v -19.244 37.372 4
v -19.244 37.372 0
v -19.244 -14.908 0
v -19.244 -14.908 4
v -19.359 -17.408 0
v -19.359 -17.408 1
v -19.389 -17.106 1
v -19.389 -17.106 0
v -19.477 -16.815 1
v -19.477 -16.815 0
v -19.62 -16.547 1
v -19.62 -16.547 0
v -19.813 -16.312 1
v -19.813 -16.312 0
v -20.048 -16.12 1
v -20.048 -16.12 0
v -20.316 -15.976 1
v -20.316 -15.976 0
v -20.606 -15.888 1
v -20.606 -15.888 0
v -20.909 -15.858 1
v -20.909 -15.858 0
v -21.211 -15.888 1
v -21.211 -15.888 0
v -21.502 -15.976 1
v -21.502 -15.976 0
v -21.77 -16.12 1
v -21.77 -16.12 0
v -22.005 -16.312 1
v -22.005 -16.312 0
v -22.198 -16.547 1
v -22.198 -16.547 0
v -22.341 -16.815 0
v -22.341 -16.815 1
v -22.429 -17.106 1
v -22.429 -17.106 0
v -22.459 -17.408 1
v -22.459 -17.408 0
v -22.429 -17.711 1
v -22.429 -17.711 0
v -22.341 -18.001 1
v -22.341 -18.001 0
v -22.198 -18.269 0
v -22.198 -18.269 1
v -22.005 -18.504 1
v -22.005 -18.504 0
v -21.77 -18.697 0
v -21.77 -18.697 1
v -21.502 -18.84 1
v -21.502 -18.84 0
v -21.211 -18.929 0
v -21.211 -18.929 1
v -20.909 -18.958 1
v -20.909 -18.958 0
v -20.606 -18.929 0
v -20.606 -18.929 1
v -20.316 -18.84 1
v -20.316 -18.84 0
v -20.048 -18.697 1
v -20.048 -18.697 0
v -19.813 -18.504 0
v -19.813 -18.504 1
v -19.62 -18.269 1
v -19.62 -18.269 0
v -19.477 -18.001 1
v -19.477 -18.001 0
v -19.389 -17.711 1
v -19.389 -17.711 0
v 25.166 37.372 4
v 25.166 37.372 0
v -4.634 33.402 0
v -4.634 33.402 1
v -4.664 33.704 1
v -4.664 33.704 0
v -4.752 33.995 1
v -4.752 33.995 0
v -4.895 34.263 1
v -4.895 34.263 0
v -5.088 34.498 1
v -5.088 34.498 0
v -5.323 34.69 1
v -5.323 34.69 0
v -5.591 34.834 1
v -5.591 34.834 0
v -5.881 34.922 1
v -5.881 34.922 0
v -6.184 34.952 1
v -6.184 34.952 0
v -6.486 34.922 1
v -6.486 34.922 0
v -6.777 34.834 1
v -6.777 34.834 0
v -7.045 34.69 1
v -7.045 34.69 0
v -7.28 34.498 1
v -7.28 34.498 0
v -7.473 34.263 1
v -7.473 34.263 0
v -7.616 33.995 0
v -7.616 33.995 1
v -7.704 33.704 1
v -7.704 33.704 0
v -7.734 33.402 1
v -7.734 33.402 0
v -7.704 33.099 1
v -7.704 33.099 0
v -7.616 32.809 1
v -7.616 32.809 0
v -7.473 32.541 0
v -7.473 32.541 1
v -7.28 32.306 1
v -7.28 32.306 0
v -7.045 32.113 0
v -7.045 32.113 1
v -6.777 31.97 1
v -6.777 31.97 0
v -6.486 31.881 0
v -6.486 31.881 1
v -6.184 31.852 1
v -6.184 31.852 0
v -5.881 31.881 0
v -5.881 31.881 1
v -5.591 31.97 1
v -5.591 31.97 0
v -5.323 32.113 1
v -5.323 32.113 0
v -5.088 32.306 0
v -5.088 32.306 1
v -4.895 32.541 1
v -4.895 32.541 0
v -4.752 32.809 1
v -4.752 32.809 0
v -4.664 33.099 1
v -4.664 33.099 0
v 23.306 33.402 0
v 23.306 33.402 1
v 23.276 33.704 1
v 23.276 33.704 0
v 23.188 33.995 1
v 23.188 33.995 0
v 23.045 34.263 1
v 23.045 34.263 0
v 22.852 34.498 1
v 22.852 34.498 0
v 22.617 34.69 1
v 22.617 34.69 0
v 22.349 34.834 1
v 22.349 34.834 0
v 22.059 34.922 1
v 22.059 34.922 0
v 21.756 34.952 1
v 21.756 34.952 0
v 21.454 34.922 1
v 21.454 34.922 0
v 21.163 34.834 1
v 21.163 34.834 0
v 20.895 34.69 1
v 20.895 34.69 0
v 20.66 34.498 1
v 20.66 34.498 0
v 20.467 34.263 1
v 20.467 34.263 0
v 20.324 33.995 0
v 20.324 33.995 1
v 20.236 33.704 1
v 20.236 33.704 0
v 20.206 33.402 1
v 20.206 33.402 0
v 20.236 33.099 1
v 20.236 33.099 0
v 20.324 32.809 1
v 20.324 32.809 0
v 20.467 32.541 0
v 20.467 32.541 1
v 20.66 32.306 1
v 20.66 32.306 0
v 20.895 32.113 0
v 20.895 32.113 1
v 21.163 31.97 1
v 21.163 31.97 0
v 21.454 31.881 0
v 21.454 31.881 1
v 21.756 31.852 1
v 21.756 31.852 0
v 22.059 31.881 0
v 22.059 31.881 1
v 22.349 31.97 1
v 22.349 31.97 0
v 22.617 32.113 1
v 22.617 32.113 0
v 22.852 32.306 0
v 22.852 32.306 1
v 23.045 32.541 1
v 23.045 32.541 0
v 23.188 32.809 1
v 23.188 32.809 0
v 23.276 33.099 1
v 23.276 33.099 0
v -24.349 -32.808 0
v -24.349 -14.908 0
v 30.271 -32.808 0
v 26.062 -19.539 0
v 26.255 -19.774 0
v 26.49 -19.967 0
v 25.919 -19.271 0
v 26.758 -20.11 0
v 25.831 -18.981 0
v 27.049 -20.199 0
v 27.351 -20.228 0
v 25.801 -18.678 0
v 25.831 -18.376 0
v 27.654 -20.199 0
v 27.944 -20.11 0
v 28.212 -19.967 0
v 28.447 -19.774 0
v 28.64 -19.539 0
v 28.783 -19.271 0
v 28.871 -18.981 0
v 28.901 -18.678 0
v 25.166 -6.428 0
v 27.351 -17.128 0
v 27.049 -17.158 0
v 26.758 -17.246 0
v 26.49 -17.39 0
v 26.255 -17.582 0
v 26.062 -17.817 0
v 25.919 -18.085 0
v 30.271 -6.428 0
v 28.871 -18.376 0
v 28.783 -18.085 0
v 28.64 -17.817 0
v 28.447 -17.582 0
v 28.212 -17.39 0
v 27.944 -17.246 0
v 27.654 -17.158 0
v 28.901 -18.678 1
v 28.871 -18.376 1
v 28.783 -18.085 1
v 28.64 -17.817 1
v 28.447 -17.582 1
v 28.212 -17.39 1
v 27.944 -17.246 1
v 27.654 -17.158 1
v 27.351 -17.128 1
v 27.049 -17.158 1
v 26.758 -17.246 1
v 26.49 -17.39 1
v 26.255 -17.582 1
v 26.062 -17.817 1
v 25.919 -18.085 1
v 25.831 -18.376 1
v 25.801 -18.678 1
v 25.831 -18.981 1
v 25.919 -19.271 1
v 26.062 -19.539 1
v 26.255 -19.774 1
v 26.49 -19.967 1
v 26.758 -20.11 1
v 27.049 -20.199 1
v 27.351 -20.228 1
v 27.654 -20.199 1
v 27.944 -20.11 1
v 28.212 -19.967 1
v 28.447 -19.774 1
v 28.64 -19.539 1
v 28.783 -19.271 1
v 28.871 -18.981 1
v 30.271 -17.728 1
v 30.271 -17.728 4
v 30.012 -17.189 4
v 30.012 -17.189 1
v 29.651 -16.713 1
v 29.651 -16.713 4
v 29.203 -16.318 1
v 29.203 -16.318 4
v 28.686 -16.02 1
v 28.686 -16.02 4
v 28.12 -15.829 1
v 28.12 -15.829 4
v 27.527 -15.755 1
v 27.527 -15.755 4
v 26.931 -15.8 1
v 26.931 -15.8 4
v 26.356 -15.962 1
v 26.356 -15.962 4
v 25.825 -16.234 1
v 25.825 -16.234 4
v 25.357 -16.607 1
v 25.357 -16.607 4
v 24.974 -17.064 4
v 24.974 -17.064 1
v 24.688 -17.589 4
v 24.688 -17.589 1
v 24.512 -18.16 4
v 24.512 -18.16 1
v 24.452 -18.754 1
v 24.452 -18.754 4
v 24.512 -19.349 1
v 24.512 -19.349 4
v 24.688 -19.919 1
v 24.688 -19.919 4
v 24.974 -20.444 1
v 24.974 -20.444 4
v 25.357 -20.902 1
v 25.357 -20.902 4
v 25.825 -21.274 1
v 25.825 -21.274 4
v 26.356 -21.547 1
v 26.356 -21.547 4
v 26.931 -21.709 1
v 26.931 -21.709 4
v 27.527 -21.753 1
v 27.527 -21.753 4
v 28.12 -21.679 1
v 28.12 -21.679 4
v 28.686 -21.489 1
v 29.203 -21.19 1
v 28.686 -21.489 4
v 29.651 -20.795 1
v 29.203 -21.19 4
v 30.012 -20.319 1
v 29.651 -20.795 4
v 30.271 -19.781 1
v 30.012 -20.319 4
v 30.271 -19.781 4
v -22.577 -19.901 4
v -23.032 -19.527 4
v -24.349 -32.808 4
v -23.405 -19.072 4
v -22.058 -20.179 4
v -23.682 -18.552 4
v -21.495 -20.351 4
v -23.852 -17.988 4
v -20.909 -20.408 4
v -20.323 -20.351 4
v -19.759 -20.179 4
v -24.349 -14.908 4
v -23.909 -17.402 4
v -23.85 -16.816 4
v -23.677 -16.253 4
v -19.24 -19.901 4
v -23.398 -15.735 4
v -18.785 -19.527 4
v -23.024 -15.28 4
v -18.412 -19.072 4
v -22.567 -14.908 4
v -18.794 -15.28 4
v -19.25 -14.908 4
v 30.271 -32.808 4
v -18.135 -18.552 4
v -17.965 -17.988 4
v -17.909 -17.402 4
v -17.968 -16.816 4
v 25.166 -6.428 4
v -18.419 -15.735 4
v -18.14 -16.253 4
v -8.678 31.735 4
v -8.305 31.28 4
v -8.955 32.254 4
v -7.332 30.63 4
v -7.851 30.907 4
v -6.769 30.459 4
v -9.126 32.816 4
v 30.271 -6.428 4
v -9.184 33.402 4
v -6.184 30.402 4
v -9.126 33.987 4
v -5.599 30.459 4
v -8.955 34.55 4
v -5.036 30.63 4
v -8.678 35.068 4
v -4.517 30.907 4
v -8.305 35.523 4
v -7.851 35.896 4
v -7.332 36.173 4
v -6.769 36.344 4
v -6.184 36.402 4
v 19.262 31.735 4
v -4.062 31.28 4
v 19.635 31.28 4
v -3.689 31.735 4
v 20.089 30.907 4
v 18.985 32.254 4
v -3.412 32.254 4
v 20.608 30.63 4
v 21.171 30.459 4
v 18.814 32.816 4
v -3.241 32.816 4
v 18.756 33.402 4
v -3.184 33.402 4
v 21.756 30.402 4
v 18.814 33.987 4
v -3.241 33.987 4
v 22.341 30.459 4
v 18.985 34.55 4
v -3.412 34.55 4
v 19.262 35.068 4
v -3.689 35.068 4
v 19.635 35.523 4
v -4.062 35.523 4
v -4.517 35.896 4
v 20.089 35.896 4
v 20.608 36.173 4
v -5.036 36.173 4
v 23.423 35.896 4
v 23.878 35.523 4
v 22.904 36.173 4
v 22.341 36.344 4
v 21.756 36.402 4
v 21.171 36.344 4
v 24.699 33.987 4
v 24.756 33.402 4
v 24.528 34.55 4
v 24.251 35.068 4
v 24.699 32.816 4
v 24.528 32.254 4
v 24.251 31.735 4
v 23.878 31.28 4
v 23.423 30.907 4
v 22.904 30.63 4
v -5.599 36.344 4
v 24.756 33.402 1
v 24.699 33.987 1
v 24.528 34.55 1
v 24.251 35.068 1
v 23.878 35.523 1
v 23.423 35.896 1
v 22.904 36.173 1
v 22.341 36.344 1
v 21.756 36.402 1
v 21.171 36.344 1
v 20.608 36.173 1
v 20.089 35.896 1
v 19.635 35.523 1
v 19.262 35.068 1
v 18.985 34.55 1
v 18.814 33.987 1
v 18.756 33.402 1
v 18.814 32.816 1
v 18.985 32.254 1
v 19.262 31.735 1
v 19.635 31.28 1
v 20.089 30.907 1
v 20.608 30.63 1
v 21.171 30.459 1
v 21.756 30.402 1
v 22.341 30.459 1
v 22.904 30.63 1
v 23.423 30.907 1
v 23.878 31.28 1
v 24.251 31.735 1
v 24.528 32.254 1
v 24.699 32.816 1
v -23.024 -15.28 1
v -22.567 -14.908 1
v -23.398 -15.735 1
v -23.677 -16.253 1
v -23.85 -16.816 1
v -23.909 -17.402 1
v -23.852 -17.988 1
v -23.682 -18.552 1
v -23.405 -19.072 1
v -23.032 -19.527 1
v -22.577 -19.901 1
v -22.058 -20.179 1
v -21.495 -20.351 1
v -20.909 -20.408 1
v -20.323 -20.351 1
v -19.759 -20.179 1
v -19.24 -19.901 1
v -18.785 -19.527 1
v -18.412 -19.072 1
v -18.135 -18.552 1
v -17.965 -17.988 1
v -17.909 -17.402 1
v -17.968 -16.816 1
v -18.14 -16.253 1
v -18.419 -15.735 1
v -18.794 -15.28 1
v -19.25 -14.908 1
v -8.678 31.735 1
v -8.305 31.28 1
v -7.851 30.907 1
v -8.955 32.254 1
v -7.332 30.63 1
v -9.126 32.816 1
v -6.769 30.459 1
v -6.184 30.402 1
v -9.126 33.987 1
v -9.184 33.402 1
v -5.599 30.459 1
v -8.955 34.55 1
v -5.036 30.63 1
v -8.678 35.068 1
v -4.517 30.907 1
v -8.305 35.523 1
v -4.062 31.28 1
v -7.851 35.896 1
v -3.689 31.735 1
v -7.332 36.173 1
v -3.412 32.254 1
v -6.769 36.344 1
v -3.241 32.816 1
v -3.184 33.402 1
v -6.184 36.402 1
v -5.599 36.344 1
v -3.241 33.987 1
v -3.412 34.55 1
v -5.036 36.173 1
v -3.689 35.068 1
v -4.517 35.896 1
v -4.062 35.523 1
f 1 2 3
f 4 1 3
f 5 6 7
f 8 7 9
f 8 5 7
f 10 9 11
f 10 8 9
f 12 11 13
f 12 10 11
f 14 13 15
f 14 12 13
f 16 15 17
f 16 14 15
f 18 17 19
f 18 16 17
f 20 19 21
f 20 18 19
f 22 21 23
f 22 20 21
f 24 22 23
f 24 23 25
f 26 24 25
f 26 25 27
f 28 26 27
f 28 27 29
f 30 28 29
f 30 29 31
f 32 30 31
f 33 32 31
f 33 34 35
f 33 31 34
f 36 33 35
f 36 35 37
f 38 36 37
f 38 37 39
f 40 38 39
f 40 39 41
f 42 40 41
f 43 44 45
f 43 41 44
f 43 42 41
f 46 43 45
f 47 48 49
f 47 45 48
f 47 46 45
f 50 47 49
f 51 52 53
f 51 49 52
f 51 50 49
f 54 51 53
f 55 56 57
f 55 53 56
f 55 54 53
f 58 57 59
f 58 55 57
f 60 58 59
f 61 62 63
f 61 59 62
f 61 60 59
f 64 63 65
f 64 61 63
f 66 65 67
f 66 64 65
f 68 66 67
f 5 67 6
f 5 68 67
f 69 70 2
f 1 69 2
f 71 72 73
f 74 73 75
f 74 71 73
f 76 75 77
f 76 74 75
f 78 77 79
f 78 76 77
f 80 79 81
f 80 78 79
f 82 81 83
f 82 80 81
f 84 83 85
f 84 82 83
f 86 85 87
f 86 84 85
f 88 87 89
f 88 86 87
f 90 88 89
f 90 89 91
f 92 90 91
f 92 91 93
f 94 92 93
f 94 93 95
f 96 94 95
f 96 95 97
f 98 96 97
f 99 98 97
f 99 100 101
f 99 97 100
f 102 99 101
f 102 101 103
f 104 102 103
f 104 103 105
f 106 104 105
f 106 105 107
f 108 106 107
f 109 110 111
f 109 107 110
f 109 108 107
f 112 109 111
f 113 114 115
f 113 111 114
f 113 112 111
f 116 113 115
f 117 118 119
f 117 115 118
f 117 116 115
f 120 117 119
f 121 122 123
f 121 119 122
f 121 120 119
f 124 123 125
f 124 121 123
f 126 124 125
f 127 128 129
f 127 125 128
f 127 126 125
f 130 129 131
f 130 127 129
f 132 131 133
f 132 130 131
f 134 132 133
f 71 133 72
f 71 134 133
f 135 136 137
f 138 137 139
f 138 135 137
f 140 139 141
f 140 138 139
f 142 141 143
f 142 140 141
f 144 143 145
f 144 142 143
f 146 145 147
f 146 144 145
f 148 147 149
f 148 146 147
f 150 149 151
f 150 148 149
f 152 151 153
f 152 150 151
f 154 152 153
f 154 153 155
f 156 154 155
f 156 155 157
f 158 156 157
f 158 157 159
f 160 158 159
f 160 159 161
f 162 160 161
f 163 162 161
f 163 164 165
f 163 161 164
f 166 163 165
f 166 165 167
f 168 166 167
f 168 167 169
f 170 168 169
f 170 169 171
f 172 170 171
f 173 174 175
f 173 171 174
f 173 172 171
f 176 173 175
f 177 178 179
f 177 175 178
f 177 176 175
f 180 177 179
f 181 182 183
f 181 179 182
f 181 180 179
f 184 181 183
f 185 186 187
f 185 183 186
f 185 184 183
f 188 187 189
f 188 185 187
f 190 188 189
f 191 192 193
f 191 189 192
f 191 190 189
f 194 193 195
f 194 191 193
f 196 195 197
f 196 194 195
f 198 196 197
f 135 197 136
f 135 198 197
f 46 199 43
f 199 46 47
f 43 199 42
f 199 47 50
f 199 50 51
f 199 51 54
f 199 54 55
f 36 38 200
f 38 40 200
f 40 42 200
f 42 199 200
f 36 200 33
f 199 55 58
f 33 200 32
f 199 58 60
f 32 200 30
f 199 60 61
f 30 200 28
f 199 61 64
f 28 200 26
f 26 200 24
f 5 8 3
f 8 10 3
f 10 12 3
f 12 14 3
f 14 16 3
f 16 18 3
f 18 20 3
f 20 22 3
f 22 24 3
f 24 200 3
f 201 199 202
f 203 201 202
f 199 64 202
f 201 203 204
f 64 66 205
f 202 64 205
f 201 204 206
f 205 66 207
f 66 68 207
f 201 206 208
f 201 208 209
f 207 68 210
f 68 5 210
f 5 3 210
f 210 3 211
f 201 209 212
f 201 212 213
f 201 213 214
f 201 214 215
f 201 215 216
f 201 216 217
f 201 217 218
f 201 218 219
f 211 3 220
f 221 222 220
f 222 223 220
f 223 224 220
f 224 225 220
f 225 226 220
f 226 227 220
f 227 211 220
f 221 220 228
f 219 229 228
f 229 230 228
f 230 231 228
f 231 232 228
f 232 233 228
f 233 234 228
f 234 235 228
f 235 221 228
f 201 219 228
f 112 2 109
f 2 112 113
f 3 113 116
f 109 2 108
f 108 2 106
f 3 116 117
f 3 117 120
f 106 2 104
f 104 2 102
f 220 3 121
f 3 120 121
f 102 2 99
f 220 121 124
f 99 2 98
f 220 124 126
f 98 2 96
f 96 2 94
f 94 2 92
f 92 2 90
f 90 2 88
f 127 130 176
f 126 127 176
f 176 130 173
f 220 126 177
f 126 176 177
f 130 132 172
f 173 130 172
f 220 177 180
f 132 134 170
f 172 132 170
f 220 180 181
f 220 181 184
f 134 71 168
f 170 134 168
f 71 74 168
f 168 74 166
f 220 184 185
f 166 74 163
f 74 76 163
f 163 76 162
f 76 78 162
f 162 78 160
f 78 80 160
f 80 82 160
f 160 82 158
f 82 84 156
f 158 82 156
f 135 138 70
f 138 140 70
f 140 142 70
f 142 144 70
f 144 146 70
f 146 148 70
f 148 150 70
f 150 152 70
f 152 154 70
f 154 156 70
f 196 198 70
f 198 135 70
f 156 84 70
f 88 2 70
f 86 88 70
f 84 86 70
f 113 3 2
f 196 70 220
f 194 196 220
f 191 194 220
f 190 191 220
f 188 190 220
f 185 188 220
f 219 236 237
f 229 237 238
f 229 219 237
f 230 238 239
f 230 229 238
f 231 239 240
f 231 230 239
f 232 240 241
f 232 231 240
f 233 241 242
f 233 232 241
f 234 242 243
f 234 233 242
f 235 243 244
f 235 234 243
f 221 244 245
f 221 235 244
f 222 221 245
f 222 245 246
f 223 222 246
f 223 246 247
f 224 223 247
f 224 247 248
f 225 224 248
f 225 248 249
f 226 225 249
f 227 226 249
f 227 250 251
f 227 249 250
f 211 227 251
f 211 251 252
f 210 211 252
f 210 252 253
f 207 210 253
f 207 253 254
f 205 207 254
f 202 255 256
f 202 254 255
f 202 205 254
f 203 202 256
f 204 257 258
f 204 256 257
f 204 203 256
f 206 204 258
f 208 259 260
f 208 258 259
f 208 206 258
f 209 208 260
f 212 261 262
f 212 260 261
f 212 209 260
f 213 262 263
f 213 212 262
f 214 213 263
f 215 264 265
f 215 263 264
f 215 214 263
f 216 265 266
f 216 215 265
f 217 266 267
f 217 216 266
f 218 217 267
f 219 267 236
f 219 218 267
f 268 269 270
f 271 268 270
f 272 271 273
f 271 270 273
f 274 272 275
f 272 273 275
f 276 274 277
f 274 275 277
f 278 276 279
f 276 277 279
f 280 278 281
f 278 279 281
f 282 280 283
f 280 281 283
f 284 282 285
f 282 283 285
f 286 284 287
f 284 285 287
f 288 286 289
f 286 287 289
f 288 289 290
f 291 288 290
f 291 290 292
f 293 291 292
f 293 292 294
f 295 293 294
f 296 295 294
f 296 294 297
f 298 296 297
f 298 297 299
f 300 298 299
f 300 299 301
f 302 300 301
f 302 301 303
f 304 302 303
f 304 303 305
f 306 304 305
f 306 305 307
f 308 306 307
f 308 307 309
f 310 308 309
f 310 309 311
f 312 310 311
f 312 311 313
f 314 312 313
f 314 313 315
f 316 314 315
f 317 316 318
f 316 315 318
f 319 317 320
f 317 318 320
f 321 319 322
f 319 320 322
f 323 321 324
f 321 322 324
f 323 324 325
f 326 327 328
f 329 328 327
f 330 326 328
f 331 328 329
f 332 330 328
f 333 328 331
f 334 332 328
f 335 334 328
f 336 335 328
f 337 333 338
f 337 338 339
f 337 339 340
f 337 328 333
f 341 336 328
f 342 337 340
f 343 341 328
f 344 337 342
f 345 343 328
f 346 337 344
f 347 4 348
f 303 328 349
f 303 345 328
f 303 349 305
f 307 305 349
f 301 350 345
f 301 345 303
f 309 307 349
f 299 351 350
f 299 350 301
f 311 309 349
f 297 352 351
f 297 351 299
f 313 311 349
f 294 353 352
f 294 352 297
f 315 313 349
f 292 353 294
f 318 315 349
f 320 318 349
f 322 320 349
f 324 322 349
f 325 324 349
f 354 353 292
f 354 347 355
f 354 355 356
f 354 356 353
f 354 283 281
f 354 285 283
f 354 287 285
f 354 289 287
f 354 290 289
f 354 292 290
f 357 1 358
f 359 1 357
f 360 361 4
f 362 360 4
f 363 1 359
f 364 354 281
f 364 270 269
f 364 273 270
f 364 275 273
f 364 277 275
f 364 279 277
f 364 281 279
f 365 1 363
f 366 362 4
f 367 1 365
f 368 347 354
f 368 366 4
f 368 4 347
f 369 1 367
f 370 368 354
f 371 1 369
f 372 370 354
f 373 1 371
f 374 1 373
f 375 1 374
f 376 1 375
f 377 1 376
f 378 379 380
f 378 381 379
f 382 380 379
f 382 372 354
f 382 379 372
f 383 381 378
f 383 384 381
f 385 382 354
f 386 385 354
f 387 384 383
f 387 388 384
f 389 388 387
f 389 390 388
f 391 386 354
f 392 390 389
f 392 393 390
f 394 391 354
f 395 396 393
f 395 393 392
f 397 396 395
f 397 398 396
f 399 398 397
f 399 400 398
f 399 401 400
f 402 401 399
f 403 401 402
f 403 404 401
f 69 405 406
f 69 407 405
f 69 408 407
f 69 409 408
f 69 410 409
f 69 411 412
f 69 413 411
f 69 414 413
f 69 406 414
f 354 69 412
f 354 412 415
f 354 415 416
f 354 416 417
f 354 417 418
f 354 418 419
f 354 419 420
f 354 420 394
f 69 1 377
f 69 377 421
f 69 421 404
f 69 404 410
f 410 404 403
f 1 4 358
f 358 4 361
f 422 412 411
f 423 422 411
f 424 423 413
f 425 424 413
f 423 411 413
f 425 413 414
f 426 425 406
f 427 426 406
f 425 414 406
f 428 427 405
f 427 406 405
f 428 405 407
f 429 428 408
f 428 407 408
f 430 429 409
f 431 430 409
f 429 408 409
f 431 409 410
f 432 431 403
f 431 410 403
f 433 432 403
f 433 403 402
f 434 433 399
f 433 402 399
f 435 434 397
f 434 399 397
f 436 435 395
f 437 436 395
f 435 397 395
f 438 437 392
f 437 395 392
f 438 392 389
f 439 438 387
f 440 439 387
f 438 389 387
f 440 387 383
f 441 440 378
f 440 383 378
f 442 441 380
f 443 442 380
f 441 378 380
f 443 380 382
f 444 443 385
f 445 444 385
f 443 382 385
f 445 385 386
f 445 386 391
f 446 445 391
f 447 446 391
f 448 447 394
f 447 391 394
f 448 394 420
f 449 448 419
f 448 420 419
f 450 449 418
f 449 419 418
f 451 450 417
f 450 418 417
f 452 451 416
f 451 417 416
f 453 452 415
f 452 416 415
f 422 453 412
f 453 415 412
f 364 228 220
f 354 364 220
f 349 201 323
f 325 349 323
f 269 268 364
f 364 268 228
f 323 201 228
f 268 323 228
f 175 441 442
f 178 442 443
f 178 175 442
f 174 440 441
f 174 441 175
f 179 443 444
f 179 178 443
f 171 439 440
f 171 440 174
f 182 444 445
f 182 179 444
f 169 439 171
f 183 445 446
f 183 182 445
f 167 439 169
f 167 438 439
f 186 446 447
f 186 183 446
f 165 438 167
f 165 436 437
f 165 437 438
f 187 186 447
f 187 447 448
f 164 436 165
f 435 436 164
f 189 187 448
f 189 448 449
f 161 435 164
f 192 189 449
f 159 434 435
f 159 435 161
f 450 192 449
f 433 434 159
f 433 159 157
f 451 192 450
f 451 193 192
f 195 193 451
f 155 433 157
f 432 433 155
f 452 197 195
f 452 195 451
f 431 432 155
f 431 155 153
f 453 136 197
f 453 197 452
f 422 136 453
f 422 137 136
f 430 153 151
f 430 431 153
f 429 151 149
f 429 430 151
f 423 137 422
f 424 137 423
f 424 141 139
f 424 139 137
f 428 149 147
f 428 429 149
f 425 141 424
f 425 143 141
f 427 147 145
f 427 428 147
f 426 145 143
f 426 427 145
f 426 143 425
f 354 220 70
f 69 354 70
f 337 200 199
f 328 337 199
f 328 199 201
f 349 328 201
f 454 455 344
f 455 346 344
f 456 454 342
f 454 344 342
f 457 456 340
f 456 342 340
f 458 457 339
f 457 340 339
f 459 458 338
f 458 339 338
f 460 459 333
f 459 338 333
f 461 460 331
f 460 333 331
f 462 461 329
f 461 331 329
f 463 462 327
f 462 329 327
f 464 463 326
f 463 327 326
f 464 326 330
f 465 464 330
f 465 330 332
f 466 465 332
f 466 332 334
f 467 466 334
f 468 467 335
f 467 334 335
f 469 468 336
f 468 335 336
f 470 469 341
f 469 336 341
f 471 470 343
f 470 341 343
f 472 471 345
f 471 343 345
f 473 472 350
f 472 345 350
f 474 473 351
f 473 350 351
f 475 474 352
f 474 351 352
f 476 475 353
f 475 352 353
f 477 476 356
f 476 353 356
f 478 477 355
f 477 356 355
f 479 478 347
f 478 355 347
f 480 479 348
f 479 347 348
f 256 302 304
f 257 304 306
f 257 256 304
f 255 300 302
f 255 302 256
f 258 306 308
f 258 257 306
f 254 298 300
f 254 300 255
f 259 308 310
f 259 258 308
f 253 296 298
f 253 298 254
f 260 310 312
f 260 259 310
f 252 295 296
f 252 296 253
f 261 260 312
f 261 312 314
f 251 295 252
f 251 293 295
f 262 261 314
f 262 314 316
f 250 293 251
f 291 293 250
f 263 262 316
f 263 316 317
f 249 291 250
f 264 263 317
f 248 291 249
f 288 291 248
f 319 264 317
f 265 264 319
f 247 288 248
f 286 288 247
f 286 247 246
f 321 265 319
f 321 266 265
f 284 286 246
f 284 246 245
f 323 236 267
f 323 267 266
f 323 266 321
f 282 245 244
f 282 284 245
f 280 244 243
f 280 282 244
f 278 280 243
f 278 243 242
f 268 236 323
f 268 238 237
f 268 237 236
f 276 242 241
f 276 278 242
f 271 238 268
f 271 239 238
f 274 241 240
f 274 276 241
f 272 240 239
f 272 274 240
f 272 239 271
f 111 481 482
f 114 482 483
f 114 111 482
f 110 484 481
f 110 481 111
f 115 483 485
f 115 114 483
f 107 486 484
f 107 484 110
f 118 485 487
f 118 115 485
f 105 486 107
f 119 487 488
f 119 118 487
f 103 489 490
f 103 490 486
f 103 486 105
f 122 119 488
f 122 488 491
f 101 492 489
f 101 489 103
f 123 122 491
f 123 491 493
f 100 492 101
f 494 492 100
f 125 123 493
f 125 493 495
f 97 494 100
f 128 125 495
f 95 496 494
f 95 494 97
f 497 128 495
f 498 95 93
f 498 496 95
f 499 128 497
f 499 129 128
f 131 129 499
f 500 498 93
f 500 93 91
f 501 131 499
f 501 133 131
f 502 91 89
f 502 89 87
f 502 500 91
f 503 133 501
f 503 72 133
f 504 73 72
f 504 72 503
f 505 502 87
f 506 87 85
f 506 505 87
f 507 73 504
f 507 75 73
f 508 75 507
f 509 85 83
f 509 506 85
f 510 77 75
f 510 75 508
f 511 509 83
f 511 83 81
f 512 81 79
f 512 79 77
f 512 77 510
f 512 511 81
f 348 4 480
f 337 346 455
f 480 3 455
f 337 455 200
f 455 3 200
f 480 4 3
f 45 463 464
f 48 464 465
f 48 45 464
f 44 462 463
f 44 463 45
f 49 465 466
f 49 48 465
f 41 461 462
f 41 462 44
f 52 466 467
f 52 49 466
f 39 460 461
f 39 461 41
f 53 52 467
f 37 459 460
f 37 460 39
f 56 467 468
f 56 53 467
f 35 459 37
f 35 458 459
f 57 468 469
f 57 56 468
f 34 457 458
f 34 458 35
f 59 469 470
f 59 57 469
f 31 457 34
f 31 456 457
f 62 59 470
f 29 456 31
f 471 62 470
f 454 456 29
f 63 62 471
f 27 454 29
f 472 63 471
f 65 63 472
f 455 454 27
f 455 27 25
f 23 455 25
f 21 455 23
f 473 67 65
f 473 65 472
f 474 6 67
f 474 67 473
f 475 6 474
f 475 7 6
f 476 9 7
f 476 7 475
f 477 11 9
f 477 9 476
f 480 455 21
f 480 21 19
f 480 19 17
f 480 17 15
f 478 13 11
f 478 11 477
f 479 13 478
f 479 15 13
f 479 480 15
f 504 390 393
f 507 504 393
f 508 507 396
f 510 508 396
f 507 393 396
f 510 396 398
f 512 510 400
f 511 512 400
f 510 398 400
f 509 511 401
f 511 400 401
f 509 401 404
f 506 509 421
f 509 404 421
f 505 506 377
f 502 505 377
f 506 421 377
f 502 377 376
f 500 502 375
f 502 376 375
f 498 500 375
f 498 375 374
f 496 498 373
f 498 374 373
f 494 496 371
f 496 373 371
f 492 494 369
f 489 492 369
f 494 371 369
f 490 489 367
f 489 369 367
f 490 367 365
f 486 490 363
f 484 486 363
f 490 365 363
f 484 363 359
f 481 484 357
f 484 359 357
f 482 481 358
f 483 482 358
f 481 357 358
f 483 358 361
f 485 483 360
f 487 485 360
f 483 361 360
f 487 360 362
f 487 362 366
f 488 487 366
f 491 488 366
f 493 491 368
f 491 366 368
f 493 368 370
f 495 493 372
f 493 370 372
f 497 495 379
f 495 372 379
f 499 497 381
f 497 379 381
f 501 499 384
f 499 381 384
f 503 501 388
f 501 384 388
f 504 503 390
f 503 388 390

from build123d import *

# Parameters (mm, degrees)
F0_R     = 1.55
F1_DEPTH = 4
F2_R     = 3
F3_DEPTH = 3


with BuildPart() as f1:
    # F0 (on Top) → F1 (new body)
    with BuildSketch(Plane.XY):
        Polygon((25.166199, 37.371666), (-19.243801, 37.371666), (-19.243801, -14.908334), (-24.348801, -14.908334), (-24.348801, -32.808334), (30.271199, -32.808334), (30.271199, -6.428334), (25.166199, -6.428334), align=None)
        with Locations((-20.908801, -17.408334)):
            Circle(F0_R, mode=Mode.SUBTRACT)
        with Locations((27.351199, -18.678334)):
            Circle(F0_R, mode=Mode.SUBTRACT)
        with Locations((-6.183801, 33.401666)):
            Circle(F0_R, mode=Mode.SUBTRACT)
        with Locations((21.756199, 33.401666)):
            Circle(F0_R, mode=Mode.SUBTRACT)
    extrude(amount=F1_DEPTH)

    # F2 (on face) → F3 (cut)
    with BuildSketch(Plane.XY.offset(4)):
        with Locations((-20.908801, -17.408334)):
            Circle(F2_R)
        with Locations((27.452319, -18.754228)):
            Circle(F2_R)
        with Locations((-6.183801, 33.401666)):
            Circle(F2_R)
        with Locations((21.756199, 33.401666)):
            Circle(F2_R)
    extrude(amount=-F3_DEPTH, mode=Mode.SUBTRACT)


solid = f1.part
